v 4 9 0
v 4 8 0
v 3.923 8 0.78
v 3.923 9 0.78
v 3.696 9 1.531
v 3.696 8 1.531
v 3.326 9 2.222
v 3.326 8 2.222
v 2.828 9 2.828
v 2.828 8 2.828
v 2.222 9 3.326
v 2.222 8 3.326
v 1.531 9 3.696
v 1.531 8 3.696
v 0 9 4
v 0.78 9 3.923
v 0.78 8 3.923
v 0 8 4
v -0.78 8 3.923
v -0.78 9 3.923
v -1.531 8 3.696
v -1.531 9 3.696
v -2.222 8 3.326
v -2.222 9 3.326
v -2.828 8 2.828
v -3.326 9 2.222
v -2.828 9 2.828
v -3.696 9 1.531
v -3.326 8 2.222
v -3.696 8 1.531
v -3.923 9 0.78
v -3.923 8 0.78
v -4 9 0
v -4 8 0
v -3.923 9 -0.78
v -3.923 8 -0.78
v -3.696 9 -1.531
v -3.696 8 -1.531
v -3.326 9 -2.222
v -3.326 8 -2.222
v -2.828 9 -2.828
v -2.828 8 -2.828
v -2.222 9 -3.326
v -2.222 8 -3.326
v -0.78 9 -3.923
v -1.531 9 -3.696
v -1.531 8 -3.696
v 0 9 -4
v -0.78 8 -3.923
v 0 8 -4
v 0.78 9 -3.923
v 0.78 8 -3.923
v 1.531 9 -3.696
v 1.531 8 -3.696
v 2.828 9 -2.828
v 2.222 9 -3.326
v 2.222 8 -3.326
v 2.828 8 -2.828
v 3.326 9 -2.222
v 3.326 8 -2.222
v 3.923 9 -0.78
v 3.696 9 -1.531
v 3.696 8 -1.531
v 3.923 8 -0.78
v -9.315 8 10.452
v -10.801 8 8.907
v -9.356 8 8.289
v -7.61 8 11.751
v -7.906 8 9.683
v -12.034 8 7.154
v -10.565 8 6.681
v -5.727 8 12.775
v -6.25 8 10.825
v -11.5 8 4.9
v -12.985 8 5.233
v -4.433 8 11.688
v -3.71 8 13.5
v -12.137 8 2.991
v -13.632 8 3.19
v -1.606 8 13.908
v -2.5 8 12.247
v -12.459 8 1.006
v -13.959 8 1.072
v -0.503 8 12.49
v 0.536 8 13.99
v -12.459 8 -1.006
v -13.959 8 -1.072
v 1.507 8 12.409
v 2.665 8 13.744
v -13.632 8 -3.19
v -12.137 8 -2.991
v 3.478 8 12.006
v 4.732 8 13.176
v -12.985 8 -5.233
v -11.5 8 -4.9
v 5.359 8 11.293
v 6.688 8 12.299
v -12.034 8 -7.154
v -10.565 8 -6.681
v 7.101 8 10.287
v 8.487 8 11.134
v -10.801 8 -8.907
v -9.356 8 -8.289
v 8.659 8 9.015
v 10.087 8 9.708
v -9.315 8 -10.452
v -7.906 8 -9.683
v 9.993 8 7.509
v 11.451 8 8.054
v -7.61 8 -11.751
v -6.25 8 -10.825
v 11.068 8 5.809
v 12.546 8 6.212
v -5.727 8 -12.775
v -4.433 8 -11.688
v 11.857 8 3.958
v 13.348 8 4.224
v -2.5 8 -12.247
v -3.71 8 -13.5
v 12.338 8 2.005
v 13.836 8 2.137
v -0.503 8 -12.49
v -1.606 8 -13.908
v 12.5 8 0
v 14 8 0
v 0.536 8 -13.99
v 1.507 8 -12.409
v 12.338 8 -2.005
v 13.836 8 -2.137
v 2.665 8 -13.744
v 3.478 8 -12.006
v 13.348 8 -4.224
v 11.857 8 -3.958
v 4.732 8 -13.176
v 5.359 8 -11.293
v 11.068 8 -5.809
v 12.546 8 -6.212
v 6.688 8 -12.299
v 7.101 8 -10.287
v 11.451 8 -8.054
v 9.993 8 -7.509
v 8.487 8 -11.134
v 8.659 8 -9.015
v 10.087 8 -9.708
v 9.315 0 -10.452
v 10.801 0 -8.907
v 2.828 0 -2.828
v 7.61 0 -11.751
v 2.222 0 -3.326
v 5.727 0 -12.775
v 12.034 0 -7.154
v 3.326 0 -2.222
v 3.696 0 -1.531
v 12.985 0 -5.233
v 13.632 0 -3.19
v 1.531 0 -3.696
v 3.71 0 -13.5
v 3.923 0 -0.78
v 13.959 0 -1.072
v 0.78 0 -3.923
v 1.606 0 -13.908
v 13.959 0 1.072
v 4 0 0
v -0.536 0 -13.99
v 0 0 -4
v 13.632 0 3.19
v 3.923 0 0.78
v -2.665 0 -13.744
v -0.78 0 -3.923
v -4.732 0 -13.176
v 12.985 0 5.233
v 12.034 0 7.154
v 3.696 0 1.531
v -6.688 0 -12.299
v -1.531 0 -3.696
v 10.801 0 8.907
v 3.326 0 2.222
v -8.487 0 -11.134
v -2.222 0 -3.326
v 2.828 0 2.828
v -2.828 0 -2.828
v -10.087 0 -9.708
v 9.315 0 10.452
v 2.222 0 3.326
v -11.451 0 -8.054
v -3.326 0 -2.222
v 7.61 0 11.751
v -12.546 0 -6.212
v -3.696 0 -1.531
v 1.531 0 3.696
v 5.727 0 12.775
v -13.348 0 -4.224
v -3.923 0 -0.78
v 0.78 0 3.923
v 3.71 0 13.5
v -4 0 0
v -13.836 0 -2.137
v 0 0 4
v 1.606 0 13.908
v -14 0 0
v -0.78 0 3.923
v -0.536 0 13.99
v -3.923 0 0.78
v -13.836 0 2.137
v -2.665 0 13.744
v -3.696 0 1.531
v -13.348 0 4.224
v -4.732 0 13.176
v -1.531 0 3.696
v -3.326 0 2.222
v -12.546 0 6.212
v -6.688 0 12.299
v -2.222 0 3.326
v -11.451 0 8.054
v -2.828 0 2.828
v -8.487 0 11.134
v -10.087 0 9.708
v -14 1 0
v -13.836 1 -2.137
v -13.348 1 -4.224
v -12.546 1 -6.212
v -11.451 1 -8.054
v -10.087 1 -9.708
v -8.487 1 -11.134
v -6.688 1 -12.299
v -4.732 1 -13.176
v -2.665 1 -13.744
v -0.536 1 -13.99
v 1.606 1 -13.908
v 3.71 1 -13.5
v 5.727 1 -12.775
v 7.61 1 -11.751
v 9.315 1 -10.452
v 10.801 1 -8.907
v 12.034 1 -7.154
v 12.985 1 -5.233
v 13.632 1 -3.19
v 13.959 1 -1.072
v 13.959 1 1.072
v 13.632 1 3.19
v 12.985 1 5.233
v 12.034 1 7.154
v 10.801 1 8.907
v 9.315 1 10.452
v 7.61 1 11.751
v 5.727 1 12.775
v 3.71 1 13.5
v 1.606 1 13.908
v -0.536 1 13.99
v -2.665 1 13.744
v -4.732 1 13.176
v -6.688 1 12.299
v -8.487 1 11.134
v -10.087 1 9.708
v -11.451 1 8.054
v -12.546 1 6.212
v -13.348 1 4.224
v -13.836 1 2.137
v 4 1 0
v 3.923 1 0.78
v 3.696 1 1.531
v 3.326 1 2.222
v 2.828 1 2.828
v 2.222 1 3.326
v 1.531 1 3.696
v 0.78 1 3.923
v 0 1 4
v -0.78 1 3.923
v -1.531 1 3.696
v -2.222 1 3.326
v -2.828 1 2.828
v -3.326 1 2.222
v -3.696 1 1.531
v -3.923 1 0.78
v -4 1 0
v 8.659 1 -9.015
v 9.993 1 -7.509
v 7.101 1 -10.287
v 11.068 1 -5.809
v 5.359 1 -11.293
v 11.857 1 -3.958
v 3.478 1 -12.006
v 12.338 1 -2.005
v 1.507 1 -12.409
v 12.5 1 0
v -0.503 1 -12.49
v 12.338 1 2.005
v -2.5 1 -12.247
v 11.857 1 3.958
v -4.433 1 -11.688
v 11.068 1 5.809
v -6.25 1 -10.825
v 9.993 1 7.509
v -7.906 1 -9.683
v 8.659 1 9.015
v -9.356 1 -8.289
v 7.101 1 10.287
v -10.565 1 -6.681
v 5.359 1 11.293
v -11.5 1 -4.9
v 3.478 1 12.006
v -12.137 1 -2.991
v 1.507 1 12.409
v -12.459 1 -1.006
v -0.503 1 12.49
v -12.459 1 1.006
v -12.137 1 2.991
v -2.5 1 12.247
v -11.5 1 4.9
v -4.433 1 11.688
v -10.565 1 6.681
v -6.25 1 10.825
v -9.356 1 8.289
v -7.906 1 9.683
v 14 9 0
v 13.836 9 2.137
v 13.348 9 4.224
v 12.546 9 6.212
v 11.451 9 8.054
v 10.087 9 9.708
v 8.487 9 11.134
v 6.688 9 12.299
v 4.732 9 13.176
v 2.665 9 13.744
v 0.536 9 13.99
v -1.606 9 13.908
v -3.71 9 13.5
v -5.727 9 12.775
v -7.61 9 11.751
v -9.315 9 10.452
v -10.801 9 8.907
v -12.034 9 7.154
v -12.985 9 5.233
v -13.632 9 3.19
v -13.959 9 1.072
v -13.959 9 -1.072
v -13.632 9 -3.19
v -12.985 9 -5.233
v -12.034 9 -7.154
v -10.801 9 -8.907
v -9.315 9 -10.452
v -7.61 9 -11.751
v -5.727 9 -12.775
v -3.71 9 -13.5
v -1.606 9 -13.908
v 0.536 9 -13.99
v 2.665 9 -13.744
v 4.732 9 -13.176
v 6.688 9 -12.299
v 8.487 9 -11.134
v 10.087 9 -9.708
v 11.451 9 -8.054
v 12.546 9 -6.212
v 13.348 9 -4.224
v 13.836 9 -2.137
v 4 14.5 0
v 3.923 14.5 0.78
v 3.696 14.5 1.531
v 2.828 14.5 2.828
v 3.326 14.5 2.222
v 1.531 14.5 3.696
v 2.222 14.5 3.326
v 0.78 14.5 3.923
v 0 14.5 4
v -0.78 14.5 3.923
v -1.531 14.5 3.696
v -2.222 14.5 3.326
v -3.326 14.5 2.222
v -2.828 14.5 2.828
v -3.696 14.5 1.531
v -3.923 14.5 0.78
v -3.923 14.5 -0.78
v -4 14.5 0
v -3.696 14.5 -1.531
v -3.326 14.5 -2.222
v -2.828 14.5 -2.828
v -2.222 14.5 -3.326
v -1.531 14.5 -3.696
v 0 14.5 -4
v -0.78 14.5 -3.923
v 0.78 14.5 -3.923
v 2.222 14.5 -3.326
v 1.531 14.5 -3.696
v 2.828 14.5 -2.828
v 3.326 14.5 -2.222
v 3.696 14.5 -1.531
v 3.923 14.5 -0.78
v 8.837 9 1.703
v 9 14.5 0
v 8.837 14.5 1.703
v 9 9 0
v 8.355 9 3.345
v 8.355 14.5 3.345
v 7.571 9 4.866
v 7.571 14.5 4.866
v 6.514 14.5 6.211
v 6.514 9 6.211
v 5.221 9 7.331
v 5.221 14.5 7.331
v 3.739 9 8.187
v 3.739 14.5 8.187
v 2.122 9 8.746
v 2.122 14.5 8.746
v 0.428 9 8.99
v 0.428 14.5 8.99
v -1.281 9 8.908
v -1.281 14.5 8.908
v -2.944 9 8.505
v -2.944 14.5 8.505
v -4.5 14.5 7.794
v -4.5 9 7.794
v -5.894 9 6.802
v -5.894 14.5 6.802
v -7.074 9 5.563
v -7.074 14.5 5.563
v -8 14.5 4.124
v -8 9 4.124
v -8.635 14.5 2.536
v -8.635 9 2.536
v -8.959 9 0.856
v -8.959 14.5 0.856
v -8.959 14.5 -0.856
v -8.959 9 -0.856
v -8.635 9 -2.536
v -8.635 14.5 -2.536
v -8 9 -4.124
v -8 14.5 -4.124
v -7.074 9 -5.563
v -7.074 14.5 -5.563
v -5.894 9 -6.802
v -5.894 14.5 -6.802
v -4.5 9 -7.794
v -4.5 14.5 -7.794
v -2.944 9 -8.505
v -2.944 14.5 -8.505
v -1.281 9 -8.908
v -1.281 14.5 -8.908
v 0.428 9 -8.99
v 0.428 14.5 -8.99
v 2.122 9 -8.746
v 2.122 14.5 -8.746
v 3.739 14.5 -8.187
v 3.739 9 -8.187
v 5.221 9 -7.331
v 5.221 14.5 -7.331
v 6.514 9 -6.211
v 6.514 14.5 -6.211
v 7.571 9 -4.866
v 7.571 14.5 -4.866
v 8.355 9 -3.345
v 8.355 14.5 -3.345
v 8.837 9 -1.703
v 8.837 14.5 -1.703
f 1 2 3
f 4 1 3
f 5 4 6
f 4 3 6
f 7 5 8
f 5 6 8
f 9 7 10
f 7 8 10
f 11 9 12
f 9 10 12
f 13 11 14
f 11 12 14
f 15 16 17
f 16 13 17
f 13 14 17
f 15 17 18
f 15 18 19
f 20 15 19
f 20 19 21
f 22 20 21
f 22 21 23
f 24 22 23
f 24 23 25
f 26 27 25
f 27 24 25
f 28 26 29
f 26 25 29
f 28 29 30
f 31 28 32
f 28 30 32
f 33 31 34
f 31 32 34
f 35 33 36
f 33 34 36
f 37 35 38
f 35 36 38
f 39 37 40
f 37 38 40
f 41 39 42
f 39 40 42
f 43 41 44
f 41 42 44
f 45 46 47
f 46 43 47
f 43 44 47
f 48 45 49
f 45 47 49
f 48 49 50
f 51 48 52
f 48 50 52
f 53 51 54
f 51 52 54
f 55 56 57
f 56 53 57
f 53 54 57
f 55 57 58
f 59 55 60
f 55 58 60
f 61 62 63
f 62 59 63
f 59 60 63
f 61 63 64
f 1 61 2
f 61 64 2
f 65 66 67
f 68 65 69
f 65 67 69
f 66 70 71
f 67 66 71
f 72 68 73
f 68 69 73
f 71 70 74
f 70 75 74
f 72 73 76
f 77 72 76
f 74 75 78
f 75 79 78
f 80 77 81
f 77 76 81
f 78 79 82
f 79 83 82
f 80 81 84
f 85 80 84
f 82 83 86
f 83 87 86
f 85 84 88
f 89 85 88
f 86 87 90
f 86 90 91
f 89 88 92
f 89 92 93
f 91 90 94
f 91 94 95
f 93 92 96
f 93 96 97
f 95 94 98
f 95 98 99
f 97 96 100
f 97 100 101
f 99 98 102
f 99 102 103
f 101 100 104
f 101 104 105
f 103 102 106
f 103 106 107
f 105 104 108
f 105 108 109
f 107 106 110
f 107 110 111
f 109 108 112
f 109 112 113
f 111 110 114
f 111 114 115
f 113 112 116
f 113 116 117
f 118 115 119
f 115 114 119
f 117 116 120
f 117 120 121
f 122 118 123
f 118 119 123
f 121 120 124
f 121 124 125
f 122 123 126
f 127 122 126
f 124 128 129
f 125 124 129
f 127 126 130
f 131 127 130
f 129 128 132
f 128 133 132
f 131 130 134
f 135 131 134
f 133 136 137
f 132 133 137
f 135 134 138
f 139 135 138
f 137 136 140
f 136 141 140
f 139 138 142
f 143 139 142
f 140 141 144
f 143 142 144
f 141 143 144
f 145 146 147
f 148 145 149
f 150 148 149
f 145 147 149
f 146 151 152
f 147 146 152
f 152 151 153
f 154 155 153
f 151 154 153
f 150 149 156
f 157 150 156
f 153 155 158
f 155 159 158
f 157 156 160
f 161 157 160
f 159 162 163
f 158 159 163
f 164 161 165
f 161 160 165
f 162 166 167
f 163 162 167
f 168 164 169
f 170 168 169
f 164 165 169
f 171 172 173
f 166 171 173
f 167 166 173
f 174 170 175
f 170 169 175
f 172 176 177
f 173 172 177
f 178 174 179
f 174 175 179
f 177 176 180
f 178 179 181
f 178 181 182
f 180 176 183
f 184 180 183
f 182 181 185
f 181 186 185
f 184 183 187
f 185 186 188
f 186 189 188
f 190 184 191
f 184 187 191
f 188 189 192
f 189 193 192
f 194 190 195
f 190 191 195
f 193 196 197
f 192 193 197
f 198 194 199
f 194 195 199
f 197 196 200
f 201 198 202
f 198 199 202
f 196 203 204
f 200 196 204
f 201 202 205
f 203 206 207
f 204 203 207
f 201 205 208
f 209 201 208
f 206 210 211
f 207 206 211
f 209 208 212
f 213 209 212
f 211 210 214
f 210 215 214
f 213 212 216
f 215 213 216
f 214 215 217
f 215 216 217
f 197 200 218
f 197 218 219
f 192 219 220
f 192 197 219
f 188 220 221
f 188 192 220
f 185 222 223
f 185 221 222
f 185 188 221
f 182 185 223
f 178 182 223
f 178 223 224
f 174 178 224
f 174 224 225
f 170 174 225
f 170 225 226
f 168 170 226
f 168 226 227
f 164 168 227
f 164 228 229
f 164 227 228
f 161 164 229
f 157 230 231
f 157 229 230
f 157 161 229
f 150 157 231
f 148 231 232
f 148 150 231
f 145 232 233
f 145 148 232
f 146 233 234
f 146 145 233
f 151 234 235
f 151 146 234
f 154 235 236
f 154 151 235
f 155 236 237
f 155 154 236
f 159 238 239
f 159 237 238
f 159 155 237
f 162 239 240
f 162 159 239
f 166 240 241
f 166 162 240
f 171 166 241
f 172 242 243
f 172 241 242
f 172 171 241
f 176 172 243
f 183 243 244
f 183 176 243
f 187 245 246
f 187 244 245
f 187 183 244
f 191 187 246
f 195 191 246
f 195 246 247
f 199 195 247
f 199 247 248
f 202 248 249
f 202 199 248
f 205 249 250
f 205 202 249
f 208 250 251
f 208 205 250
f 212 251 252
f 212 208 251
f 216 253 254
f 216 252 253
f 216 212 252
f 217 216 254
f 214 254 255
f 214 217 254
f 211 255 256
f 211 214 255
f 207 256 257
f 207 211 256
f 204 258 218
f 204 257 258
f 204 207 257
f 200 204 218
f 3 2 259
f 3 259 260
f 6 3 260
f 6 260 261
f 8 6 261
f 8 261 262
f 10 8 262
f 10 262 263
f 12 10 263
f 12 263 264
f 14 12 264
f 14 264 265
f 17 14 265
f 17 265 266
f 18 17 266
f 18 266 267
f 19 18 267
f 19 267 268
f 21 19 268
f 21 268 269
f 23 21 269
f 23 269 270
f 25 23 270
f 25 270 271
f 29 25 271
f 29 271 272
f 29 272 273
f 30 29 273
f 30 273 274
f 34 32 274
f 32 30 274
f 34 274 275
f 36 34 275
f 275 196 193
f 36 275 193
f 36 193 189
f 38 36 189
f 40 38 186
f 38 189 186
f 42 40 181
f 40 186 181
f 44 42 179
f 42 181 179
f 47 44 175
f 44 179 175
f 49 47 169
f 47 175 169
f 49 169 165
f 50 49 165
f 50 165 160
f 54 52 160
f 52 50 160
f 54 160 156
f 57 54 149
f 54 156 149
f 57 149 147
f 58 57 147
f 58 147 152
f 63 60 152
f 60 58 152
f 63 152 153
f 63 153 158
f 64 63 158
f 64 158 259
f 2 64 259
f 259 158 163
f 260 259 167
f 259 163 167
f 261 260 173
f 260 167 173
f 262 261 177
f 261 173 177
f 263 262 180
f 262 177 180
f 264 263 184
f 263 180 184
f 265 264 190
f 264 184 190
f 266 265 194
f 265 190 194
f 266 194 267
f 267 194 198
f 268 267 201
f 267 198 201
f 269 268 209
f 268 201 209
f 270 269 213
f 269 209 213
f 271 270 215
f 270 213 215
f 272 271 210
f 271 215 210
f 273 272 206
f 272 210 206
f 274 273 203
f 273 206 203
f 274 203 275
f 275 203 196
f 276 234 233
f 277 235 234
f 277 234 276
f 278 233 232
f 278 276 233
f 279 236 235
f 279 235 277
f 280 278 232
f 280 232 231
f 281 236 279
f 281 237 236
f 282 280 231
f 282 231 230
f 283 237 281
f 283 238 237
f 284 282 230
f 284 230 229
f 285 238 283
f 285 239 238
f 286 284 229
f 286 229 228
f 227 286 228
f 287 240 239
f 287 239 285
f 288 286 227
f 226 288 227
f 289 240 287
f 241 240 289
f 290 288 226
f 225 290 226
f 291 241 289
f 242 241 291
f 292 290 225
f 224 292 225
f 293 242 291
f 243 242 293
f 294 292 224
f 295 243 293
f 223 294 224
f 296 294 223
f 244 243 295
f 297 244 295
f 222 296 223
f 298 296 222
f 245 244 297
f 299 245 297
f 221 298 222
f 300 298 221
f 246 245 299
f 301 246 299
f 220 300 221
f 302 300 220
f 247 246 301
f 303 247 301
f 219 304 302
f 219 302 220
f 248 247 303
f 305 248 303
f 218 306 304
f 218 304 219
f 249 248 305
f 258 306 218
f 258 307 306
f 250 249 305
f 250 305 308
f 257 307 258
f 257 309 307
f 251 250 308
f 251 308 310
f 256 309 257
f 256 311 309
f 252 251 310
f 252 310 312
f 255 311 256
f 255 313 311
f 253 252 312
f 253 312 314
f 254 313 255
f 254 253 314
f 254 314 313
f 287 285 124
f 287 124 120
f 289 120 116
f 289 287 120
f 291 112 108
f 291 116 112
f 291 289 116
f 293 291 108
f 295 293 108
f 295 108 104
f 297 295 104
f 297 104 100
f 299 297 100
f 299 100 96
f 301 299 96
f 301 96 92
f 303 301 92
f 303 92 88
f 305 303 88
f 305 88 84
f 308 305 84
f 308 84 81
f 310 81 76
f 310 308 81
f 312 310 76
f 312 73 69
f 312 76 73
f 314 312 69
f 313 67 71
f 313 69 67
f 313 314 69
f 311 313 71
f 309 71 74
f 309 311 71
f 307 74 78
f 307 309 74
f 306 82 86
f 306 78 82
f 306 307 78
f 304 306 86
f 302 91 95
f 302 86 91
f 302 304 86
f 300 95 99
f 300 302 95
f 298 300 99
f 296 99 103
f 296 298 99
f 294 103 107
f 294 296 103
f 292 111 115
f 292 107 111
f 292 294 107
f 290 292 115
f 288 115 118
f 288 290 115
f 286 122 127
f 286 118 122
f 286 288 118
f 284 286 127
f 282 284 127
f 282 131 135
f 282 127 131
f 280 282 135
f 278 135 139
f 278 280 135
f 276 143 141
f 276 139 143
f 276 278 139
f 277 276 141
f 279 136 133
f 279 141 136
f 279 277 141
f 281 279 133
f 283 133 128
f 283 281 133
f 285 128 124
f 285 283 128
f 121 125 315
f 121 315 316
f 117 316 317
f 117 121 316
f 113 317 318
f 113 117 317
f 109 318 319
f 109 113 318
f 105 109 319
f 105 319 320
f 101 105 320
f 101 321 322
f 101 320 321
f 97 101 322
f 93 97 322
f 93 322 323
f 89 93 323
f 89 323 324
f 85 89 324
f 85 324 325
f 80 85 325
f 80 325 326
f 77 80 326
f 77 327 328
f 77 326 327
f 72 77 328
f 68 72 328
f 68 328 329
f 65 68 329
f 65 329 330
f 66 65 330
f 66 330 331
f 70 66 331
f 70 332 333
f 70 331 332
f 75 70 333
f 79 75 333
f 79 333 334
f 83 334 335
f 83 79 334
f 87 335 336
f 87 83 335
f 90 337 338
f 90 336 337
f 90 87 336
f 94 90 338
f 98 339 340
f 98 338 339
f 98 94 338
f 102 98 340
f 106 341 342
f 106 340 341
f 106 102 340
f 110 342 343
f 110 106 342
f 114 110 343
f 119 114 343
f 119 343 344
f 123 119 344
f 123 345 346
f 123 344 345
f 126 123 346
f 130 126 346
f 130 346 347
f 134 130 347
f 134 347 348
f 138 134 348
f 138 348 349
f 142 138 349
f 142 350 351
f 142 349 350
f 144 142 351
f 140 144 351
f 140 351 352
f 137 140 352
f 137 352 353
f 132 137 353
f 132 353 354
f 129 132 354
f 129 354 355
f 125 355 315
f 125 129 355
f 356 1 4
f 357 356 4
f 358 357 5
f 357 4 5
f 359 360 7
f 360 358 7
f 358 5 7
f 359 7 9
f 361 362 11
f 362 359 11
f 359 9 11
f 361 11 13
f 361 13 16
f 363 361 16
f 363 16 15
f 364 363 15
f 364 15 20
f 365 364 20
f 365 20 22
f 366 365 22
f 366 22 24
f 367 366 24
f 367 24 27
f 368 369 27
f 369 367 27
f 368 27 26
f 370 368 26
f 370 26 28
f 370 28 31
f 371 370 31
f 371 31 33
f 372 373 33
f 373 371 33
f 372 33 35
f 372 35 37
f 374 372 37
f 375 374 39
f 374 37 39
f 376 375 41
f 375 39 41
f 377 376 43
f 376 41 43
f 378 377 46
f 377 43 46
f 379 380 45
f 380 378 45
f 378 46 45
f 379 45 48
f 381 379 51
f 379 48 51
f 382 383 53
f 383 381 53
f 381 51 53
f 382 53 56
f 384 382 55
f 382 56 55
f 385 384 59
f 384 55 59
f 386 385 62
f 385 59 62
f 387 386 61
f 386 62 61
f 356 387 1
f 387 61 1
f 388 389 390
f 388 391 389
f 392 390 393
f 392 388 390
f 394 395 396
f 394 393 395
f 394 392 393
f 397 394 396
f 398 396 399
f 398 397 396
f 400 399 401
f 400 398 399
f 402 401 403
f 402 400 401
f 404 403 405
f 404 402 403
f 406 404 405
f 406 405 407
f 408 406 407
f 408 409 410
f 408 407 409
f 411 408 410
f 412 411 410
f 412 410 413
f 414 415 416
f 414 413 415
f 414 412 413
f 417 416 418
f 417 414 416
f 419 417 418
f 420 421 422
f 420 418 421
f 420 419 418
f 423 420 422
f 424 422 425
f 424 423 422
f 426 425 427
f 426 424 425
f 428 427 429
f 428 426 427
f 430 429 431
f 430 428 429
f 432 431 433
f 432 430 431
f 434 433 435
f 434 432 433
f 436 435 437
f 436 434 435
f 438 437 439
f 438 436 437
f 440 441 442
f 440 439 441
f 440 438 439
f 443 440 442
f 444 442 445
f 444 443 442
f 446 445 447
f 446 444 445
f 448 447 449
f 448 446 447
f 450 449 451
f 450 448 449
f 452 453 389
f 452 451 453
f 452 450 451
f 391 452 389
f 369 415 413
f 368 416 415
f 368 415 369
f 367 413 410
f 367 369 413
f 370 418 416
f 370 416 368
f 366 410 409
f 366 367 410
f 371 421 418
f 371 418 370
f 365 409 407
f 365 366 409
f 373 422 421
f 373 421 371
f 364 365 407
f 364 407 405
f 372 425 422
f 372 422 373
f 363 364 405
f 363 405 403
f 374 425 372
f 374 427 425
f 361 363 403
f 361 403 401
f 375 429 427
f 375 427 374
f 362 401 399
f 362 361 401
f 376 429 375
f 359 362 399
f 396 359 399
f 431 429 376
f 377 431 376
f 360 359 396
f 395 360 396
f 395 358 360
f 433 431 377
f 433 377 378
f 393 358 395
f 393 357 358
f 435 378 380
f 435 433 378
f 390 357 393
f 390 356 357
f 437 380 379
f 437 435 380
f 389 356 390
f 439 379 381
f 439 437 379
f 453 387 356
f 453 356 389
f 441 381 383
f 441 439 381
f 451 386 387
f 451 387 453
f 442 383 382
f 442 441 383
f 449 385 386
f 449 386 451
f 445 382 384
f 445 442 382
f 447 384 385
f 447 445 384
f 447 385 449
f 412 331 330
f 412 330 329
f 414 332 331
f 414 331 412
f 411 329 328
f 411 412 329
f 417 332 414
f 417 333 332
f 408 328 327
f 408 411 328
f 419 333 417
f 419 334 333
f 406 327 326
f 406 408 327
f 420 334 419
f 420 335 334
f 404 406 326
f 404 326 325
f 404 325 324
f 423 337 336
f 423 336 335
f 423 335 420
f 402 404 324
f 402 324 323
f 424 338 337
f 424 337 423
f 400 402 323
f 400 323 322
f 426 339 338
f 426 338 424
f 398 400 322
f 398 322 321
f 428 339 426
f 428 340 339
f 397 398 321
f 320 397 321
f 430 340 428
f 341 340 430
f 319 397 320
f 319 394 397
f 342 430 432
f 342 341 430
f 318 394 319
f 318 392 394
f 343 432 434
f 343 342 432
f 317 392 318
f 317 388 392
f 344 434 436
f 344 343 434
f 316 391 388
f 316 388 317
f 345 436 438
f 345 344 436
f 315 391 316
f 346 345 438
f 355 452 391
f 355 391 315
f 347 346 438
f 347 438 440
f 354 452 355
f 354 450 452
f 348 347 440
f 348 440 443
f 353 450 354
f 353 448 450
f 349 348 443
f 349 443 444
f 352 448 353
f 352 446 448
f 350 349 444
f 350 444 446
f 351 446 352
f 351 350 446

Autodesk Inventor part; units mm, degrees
ref_plane "YZ Plane" through (0, 0, 0) normal (1, 0, 0) x (0, 1, 0)
ref_plane "XZ Plane" through (0, 0, 0) normal (0, 1, 0) x (-1, 0, 0)
ref_plane "XY Plane" through (0, 0, 0) normal (0, 0, 1) x (1, 0, 0)
sketch "Sketch1" plane through (0, 0, 0) normal (0, 1, 0) x (-1, 0, 0)
  circle A0 centre (0, 0) radius 4
  circle A1 centre (0, 0) radius 14
  dimension "d0" = 28
  dimension "d1" = 8
extrude "Extrusion1" add sketch "Sketch1" along normal blind 1
sketch "Sketch2" plane through (0, 1, 0) normal (0, 1, 0) x (1, 0, 0)
  circle A0 centre (0, 0) radius 4
  circle A1 centre (0, 0) radius 12.5
  dimension "d4" = 25
  dimension "d7" = 8
extrude "Extrusion2" add sketch "Sketch2" along normal blind 7
sketch "Sketch3" plane through (0, 8, 0) normal (0, 1, 0) x (1, 0, 0)
  circle A0 centre (0, 0) radius 4
  circle A1 centre (0, 0) radius 14
extrude "Extrusion3" add sketch "Sketch3" along normal blind 1
sketch "Sketch4" plane through (0, 9, 0) normal (0, 1, 0) x (1, 0, 0)
  circle A0 centre (0, 0) radius 4
  circle A1 centre (0, 0) radius 9
  circle A2 centre (0, 0) radius 4 projected
  dimension "d10" = 18
extrude "Extrusion4" add sketch "Sketch4" along normal blind 5.5
properties part number "big_gear"
